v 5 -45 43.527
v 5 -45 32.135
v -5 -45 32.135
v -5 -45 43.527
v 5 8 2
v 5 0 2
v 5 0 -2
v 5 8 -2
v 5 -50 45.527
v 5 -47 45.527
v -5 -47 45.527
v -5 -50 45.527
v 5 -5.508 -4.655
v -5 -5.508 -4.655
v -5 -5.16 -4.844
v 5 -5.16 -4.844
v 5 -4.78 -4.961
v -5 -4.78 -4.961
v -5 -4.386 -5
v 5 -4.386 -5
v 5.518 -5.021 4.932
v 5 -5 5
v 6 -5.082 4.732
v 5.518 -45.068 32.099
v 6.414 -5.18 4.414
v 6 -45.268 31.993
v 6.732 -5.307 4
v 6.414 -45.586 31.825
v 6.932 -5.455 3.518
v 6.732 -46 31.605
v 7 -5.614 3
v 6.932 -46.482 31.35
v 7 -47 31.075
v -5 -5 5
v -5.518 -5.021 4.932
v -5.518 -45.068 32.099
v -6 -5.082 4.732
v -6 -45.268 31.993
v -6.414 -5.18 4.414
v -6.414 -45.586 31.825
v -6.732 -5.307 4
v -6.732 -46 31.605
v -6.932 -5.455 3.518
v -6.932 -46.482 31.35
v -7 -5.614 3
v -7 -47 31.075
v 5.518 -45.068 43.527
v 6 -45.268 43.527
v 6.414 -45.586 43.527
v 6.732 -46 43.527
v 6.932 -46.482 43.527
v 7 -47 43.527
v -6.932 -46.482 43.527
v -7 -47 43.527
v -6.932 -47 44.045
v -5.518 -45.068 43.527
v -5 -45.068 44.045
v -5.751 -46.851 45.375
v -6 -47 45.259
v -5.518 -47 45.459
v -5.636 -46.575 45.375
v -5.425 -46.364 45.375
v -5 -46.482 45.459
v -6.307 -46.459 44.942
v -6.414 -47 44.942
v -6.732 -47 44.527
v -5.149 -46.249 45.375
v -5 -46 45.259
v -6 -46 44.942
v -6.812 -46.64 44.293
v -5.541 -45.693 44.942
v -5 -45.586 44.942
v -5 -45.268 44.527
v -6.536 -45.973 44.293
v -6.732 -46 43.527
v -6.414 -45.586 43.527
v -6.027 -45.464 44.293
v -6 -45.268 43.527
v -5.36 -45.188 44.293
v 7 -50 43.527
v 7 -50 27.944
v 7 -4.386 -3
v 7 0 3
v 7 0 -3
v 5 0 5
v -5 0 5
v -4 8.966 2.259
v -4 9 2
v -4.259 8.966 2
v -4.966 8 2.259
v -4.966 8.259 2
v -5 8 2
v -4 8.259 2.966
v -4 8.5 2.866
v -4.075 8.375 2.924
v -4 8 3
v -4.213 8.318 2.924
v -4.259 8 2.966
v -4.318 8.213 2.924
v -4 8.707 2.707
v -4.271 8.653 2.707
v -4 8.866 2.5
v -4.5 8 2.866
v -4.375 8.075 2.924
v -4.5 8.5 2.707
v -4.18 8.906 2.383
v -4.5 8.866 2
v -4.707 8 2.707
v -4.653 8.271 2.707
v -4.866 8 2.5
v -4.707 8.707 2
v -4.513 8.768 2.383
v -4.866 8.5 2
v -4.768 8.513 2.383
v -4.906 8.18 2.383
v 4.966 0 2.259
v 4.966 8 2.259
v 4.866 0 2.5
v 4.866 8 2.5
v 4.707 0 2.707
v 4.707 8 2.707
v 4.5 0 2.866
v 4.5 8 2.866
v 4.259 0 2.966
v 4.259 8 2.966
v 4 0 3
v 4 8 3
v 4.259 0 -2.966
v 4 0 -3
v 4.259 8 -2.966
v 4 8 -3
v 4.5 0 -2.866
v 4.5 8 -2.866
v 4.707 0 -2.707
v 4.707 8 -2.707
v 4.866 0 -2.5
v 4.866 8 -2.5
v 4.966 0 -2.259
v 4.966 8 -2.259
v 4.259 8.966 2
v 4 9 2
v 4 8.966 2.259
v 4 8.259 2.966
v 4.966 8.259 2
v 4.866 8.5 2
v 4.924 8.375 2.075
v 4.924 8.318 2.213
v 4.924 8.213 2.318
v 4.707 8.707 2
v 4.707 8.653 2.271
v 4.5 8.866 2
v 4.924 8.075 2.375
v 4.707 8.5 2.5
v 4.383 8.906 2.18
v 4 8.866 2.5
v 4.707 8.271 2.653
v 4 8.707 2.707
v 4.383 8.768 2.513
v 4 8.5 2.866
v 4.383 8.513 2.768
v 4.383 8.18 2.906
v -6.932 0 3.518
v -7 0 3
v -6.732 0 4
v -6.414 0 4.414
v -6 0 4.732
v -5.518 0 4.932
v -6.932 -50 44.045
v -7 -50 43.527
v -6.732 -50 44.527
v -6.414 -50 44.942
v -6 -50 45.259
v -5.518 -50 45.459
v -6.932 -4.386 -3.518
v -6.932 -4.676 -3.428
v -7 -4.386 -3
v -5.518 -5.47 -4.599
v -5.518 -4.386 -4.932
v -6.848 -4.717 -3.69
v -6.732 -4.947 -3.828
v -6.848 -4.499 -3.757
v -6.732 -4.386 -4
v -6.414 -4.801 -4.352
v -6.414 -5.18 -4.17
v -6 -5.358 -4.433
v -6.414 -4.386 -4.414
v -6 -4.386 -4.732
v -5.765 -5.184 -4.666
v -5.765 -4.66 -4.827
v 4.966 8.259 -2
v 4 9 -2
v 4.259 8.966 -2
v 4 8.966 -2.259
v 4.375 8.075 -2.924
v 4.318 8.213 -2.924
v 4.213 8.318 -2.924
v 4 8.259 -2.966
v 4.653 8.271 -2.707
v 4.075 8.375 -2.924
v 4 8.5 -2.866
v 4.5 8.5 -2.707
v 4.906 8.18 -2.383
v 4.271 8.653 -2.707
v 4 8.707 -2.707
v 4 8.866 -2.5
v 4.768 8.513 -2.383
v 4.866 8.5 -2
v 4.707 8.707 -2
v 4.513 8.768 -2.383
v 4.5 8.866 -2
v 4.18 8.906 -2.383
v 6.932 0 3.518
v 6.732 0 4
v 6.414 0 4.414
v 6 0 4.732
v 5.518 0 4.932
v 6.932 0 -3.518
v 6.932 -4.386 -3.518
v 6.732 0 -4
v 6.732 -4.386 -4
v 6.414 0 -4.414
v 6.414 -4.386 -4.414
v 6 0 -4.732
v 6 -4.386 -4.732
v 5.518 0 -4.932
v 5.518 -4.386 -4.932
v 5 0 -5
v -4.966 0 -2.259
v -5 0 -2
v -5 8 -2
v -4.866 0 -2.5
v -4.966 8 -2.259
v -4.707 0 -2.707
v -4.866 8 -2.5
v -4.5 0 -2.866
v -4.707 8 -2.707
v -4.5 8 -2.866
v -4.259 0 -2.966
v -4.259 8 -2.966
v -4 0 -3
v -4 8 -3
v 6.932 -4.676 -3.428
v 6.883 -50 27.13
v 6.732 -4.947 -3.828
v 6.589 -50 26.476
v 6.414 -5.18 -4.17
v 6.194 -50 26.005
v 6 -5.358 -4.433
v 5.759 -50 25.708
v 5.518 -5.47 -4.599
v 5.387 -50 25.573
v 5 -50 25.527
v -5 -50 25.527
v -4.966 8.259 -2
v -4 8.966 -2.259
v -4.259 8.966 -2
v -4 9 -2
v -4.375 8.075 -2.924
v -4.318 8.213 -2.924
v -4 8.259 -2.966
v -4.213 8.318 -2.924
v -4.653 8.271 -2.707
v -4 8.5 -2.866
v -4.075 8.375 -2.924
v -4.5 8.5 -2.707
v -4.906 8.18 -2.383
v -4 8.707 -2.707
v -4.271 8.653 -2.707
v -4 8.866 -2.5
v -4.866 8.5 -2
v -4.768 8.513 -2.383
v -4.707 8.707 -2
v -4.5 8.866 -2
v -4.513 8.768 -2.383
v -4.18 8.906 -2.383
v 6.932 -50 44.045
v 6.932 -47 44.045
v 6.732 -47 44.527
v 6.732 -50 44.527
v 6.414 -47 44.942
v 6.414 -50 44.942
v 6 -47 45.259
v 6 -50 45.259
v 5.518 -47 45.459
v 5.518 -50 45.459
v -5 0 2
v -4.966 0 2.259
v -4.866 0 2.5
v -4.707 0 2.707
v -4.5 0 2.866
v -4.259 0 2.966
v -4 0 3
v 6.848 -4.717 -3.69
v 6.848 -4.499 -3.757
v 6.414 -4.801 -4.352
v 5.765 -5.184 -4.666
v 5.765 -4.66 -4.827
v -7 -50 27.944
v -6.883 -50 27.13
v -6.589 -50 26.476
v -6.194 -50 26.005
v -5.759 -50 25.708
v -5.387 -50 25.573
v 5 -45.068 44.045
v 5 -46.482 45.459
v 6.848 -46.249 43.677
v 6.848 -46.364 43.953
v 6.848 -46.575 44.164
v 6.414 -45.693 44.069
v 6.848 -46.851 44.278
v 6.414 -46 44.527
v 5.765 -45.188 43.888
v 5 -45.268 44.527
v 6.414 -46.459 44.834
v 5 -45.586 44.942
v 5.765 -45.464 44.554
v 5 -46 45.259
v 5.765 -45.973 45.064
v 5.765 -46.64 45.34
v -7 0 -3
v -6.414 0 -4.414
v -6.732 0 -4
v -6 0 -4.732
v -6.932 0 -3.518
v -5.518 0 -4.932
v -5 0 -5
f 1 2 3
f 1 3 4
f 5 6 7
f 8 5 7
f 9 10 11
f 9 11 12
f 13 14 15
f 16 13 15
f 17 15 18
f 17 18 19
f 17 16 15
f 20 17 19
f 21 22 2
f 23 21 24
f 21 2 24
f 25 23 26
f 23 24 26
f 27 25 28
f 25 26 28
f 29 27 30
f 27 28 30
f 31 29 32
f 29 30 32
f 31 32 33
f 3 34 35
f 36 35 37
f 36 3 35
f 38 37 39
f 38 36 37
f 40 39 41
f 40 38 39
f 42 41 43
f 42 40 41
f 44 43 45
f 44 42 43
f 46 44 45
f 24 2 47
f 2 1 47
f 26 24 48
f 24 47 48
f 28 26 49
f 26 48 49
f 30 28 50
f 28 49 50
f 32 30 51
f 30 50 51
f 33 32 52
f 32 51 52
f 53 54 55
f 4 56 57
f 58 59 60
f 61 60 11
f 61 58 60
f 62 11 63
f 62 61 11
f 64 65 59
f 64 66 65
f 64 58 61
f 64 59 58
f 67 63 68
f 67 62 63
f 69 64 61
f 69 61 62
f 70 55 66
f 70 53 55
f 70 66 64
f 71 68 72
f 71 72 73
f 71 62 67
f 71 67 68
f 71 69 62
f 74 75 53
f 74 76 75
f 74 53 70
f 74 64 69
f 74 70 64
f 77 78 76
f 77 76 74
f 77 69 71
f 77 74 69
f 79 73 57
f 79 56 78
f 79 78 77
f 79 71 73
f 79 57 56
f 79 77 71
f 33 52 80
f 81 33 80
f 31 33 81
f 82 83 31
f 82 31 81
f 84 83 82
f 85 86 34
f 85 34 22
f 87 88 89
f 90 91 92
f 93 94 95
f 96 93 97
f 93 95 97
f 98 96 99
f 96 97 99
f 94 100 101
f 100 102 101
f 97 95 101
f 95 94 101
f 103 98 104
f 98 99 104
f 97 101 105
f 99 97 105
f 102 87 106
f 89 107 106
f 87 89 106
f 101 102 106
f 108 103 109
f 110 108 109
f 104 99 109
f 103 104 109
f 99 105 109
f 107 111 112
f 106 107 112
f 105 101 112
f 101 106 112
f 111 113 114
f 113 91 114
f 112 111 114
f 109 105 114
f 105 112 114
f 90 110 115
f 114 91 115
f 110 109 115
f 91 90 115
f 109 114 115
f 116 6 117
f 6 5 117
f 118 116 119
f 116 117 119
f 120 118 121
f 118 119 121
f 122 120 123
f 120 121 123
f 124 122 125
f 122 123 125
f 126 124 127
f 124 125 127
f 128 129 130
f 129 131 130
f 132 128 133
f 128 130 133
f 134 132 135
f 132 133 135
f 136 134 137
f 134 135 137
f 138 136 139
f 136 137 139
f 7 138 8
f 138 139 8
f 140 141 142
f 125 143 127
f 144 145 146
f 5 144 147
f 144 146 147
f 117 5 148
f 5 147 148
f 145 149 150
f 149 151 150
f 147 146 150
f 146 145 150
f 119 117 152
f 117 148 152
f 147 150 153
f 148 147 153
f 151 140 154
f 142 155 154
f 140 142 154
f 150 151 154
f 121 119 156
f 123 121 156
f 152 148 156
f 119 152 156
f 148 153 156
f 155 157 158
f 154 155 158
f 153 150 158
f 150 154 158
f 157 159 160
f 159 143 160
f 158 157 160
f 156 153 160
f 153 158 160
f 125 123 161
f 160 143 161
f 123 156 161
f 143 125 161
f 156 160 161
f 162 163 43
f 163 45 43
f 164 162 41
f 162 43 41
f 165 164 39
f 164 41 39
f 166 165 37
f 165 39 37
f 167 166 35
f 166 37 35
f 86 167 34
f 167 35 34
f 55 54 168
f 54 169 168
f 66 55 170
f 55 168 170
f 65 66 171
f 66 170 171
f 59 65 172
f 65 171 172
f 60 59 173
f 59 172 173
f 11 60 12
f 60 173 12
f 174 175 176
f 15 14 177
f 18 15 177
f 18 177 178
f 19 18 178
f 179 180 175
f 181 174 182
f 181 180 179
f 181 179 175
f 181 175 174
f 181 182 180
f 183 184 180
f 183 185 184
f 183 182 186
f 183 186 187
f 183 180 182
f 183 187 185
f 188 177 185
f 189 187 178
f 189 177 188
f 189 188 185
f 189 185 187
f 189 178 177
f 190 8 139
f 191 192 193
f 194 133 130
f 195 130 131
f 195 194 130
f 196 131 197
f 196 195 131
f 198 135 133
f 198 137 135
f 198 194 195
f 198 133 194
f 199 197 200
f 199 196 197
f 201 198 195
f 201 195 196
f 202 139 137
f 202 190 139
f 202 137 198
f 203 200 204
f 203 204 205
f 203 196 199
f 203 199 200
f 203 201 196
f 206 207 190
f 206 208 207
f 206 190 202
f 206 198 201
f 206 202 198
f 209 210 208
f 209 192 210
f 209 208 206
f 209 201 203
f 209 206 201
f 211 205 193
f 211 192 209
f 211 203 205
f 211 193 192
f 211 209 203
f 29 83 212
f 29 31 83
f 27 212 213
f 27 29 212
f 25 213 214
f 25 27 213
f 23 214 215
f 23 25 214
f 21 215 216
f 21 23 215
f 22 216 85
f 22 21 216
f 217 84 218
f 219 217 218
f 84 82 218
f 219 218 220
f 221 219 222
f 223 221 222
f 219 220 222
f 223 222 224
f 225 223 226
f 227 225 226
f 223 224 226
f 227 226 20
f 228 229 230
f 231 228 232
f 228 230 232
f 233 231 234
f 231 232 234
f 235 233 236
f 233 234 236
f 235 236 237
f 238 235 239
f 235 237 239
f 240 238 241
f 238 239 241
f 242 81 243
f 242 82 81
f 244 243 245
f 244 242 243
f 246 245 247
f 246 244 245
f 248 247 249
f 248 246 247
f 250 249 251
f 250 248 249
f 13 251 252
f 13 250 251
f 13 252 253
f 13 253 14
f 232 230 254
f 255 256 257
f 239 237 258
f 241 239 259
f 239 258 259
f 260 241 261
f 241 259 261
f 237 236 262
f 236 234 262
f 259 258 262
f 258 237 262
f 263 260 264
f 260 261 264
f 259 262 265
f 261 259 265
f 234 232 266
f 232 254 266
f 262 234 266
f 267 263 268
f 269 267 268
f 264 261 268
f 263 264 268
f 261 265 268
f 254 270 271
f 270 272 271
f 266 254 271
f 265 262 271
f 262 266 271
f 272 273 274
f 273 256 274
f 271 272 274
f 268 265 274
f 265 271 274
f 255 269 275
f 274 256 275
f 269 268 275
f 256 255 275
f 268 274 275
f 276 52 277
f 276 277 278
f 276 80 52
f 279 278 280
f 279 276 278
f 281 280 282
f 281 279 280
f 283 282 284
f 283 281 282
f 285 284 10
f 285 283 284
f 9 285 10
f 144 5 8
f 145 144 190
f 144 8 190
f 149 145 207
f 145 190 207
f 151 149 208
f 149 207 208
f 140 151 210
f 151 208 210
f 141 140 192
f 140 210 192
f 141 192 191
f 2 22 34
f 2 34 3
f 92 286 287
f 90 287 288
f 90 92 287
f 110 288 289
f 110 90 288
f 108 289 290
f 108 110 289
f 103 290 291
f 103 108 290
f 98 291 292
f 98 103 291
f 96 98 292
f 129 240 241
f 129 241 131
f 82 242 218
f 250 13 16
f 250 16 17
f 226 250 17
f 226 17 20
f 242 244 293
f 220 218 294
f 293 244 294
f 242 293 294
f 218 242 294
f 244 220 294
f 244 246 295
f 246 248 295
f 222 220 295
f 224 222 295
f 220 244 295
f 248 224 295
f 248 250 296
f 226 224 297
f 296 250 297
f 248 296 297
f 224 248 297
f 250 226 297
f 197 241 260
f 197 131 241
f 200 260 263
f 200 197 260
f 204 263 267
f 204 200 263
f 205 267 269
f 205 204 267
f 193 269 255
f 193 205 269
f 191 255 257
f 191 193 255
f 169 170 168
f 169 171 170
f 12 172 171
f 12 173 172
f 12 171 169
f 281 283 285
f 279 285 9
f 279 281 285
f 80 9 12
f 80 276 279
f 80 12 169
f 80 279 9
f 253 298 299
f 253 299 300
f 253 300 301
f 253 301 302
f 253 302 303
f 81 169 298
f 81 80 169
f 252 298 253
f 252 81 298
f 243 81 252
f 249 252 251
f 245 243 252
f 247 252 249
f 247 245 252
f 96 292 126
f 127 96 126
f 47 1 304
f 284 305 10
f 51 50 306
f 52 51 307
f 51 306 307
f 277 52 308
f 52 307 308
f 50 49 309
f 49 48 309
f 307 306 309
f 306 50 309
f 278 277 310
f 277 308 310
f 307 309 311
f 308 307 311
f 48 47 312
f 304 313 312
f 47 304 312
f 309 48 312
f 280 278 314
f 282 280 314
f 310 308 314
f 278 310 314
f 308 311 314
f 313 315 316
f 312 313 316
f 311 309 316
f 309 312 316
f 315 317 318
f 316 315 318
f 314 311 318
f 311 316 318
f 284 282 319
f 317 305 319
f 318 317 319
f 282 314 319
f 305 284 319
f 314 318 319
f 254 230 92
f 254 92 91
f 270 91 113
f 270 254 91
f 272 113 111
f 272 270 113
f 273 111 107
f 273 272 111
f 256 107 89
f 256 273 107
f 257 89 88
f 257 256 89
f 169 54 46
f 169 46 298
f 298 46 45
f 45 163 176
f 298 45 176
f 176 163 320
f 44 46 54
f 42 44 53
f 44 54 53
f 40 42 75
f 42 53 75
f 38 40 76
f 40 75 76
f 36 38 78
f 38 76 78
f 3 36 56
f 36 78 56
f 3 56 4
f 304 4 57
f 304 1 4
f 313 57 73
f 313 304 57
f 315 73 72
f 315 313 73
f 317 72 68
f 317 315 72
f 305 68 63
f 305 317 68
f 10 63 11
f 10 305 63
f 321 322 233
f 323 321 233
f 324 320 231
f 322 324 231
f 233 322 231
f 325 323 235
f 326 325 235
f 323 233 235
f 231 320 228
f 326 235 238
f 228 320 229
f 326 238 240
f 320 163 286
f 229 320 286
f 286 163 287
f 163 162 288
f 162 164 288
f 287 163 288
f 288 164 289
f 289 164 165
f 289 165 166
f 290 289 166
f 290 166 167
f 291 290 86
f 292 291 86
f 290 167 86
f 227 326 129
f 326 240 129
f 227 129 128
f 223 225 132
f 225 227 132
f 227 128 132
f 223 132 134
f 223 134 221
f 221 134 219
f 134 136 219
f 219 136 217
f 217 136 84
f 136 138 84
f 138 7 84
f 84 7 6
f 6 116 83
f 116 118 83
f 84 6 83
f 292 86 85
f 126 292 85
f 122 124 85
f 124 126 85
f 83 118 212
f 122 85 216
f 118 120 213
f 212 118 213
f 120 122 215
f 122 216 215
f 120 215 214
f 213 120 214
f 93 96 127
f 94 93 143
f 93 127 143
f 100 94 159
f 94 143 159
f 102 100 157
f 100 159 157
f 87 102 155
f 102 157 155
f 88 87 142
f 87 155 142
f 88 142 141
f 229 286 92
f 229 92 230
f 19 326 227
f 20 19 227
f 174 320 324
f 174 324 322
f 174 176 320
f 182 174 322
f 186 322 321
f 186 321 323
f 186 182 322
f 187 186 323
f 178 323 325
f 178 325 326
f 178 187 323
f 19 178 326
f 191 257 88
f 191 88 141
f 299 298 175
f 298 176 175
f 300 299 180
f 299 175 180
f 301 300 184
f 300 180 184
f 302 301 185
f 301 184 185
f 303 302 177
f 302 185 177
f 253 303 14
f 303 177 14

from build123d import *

# Parameters (mm, degrees)
SKETCH1_W           = 10
SKETCH1_H           = 6
BOSS_EXTRUDE1_DEPTH = 9
SKETCH2_W           = 14
SKETCH2_H           = 10
BOSS_EXTRUDE2_DEPTH = 5
BOSS_EXTRUDE3_DEPTH = 7
FILLET1_R           = 2
FILLET2_R           = 1


with BuildPart() as part:
    # Sketch1 → Boss-Extrude1 (new body)
    with BuildSketch(Plane(origin=(0, 0, 0), x_dir=(1, 0, 0), z_dir=(0, 1, 0))):
        Rectangle(SKETCH1_W, SKETCH1_H)
    extrude(amount=BOSS_EXTRUDE1_DEPTH)

    # Sketch2 → Boss-Extrude2 (add)
    with BuildSketch(Plane.XZ):
        Rectangle(SKETCH2_W, SKETCH2_H)
    extrude(amount=BOSS_EXTRUDE2_DEPTH)

    # Sketch4 → Boss-Extrude3 (add, symmetric)
    with BuildSketch(Plane(origin=(0, 0, 0), x_dir=(0, 0, -1), z_dir=(1, 0, 0))):
        Polygon((-5, -5), (-32.135462652, -45), (-45.527395483, -45), (-45.527395483, -50), (-25.527395483, -50), (5, -5), align=None)
    extrude(amount=BOSS_EXTRUDE3_DEPTH, both=True)

    # Fillet1
    fillet1_edges = [part.edges().sort_by_distance(p)[0] for p in [
        (7, -2.5, -5),
        (7, -2.5, 5),
        (-7, -2.5, 5),
        (-7, -2.5, -5),
        (0, -5, -5),
        (-7, -25, 18.567731326),
        (-7, -45, 38.831429068),
        (-7, -47.5, 45.527395483),
        (0, -45, 45.527395483),
        (-7, -27.5, 10.263697742),
        (7, -25, 18.567731326),
        (7, -45, 38.831429068),
        (7, -47.5, 45.527395483),
        (7, -27.5, 10.263697742),
    ]]
    fillet(fillet1_edges, radius=FILLET1_R)

    # Fillet2
    fillet2_edges = [part.edges().sort_by_distance(p)[0] for p in [
        (-5, 9, 0),
        (0, 9, 3),
        (5, 9, 0),
        (5, 4.5, 3),
        (-5, 4.5, 3),
        (-5, 4.5, -3),
        (5, 4.5, -3),
        (0, 9, -3),
    ]]
    fillet(fillet2_edges, radius=FILLET2_R)


solid = part.part
